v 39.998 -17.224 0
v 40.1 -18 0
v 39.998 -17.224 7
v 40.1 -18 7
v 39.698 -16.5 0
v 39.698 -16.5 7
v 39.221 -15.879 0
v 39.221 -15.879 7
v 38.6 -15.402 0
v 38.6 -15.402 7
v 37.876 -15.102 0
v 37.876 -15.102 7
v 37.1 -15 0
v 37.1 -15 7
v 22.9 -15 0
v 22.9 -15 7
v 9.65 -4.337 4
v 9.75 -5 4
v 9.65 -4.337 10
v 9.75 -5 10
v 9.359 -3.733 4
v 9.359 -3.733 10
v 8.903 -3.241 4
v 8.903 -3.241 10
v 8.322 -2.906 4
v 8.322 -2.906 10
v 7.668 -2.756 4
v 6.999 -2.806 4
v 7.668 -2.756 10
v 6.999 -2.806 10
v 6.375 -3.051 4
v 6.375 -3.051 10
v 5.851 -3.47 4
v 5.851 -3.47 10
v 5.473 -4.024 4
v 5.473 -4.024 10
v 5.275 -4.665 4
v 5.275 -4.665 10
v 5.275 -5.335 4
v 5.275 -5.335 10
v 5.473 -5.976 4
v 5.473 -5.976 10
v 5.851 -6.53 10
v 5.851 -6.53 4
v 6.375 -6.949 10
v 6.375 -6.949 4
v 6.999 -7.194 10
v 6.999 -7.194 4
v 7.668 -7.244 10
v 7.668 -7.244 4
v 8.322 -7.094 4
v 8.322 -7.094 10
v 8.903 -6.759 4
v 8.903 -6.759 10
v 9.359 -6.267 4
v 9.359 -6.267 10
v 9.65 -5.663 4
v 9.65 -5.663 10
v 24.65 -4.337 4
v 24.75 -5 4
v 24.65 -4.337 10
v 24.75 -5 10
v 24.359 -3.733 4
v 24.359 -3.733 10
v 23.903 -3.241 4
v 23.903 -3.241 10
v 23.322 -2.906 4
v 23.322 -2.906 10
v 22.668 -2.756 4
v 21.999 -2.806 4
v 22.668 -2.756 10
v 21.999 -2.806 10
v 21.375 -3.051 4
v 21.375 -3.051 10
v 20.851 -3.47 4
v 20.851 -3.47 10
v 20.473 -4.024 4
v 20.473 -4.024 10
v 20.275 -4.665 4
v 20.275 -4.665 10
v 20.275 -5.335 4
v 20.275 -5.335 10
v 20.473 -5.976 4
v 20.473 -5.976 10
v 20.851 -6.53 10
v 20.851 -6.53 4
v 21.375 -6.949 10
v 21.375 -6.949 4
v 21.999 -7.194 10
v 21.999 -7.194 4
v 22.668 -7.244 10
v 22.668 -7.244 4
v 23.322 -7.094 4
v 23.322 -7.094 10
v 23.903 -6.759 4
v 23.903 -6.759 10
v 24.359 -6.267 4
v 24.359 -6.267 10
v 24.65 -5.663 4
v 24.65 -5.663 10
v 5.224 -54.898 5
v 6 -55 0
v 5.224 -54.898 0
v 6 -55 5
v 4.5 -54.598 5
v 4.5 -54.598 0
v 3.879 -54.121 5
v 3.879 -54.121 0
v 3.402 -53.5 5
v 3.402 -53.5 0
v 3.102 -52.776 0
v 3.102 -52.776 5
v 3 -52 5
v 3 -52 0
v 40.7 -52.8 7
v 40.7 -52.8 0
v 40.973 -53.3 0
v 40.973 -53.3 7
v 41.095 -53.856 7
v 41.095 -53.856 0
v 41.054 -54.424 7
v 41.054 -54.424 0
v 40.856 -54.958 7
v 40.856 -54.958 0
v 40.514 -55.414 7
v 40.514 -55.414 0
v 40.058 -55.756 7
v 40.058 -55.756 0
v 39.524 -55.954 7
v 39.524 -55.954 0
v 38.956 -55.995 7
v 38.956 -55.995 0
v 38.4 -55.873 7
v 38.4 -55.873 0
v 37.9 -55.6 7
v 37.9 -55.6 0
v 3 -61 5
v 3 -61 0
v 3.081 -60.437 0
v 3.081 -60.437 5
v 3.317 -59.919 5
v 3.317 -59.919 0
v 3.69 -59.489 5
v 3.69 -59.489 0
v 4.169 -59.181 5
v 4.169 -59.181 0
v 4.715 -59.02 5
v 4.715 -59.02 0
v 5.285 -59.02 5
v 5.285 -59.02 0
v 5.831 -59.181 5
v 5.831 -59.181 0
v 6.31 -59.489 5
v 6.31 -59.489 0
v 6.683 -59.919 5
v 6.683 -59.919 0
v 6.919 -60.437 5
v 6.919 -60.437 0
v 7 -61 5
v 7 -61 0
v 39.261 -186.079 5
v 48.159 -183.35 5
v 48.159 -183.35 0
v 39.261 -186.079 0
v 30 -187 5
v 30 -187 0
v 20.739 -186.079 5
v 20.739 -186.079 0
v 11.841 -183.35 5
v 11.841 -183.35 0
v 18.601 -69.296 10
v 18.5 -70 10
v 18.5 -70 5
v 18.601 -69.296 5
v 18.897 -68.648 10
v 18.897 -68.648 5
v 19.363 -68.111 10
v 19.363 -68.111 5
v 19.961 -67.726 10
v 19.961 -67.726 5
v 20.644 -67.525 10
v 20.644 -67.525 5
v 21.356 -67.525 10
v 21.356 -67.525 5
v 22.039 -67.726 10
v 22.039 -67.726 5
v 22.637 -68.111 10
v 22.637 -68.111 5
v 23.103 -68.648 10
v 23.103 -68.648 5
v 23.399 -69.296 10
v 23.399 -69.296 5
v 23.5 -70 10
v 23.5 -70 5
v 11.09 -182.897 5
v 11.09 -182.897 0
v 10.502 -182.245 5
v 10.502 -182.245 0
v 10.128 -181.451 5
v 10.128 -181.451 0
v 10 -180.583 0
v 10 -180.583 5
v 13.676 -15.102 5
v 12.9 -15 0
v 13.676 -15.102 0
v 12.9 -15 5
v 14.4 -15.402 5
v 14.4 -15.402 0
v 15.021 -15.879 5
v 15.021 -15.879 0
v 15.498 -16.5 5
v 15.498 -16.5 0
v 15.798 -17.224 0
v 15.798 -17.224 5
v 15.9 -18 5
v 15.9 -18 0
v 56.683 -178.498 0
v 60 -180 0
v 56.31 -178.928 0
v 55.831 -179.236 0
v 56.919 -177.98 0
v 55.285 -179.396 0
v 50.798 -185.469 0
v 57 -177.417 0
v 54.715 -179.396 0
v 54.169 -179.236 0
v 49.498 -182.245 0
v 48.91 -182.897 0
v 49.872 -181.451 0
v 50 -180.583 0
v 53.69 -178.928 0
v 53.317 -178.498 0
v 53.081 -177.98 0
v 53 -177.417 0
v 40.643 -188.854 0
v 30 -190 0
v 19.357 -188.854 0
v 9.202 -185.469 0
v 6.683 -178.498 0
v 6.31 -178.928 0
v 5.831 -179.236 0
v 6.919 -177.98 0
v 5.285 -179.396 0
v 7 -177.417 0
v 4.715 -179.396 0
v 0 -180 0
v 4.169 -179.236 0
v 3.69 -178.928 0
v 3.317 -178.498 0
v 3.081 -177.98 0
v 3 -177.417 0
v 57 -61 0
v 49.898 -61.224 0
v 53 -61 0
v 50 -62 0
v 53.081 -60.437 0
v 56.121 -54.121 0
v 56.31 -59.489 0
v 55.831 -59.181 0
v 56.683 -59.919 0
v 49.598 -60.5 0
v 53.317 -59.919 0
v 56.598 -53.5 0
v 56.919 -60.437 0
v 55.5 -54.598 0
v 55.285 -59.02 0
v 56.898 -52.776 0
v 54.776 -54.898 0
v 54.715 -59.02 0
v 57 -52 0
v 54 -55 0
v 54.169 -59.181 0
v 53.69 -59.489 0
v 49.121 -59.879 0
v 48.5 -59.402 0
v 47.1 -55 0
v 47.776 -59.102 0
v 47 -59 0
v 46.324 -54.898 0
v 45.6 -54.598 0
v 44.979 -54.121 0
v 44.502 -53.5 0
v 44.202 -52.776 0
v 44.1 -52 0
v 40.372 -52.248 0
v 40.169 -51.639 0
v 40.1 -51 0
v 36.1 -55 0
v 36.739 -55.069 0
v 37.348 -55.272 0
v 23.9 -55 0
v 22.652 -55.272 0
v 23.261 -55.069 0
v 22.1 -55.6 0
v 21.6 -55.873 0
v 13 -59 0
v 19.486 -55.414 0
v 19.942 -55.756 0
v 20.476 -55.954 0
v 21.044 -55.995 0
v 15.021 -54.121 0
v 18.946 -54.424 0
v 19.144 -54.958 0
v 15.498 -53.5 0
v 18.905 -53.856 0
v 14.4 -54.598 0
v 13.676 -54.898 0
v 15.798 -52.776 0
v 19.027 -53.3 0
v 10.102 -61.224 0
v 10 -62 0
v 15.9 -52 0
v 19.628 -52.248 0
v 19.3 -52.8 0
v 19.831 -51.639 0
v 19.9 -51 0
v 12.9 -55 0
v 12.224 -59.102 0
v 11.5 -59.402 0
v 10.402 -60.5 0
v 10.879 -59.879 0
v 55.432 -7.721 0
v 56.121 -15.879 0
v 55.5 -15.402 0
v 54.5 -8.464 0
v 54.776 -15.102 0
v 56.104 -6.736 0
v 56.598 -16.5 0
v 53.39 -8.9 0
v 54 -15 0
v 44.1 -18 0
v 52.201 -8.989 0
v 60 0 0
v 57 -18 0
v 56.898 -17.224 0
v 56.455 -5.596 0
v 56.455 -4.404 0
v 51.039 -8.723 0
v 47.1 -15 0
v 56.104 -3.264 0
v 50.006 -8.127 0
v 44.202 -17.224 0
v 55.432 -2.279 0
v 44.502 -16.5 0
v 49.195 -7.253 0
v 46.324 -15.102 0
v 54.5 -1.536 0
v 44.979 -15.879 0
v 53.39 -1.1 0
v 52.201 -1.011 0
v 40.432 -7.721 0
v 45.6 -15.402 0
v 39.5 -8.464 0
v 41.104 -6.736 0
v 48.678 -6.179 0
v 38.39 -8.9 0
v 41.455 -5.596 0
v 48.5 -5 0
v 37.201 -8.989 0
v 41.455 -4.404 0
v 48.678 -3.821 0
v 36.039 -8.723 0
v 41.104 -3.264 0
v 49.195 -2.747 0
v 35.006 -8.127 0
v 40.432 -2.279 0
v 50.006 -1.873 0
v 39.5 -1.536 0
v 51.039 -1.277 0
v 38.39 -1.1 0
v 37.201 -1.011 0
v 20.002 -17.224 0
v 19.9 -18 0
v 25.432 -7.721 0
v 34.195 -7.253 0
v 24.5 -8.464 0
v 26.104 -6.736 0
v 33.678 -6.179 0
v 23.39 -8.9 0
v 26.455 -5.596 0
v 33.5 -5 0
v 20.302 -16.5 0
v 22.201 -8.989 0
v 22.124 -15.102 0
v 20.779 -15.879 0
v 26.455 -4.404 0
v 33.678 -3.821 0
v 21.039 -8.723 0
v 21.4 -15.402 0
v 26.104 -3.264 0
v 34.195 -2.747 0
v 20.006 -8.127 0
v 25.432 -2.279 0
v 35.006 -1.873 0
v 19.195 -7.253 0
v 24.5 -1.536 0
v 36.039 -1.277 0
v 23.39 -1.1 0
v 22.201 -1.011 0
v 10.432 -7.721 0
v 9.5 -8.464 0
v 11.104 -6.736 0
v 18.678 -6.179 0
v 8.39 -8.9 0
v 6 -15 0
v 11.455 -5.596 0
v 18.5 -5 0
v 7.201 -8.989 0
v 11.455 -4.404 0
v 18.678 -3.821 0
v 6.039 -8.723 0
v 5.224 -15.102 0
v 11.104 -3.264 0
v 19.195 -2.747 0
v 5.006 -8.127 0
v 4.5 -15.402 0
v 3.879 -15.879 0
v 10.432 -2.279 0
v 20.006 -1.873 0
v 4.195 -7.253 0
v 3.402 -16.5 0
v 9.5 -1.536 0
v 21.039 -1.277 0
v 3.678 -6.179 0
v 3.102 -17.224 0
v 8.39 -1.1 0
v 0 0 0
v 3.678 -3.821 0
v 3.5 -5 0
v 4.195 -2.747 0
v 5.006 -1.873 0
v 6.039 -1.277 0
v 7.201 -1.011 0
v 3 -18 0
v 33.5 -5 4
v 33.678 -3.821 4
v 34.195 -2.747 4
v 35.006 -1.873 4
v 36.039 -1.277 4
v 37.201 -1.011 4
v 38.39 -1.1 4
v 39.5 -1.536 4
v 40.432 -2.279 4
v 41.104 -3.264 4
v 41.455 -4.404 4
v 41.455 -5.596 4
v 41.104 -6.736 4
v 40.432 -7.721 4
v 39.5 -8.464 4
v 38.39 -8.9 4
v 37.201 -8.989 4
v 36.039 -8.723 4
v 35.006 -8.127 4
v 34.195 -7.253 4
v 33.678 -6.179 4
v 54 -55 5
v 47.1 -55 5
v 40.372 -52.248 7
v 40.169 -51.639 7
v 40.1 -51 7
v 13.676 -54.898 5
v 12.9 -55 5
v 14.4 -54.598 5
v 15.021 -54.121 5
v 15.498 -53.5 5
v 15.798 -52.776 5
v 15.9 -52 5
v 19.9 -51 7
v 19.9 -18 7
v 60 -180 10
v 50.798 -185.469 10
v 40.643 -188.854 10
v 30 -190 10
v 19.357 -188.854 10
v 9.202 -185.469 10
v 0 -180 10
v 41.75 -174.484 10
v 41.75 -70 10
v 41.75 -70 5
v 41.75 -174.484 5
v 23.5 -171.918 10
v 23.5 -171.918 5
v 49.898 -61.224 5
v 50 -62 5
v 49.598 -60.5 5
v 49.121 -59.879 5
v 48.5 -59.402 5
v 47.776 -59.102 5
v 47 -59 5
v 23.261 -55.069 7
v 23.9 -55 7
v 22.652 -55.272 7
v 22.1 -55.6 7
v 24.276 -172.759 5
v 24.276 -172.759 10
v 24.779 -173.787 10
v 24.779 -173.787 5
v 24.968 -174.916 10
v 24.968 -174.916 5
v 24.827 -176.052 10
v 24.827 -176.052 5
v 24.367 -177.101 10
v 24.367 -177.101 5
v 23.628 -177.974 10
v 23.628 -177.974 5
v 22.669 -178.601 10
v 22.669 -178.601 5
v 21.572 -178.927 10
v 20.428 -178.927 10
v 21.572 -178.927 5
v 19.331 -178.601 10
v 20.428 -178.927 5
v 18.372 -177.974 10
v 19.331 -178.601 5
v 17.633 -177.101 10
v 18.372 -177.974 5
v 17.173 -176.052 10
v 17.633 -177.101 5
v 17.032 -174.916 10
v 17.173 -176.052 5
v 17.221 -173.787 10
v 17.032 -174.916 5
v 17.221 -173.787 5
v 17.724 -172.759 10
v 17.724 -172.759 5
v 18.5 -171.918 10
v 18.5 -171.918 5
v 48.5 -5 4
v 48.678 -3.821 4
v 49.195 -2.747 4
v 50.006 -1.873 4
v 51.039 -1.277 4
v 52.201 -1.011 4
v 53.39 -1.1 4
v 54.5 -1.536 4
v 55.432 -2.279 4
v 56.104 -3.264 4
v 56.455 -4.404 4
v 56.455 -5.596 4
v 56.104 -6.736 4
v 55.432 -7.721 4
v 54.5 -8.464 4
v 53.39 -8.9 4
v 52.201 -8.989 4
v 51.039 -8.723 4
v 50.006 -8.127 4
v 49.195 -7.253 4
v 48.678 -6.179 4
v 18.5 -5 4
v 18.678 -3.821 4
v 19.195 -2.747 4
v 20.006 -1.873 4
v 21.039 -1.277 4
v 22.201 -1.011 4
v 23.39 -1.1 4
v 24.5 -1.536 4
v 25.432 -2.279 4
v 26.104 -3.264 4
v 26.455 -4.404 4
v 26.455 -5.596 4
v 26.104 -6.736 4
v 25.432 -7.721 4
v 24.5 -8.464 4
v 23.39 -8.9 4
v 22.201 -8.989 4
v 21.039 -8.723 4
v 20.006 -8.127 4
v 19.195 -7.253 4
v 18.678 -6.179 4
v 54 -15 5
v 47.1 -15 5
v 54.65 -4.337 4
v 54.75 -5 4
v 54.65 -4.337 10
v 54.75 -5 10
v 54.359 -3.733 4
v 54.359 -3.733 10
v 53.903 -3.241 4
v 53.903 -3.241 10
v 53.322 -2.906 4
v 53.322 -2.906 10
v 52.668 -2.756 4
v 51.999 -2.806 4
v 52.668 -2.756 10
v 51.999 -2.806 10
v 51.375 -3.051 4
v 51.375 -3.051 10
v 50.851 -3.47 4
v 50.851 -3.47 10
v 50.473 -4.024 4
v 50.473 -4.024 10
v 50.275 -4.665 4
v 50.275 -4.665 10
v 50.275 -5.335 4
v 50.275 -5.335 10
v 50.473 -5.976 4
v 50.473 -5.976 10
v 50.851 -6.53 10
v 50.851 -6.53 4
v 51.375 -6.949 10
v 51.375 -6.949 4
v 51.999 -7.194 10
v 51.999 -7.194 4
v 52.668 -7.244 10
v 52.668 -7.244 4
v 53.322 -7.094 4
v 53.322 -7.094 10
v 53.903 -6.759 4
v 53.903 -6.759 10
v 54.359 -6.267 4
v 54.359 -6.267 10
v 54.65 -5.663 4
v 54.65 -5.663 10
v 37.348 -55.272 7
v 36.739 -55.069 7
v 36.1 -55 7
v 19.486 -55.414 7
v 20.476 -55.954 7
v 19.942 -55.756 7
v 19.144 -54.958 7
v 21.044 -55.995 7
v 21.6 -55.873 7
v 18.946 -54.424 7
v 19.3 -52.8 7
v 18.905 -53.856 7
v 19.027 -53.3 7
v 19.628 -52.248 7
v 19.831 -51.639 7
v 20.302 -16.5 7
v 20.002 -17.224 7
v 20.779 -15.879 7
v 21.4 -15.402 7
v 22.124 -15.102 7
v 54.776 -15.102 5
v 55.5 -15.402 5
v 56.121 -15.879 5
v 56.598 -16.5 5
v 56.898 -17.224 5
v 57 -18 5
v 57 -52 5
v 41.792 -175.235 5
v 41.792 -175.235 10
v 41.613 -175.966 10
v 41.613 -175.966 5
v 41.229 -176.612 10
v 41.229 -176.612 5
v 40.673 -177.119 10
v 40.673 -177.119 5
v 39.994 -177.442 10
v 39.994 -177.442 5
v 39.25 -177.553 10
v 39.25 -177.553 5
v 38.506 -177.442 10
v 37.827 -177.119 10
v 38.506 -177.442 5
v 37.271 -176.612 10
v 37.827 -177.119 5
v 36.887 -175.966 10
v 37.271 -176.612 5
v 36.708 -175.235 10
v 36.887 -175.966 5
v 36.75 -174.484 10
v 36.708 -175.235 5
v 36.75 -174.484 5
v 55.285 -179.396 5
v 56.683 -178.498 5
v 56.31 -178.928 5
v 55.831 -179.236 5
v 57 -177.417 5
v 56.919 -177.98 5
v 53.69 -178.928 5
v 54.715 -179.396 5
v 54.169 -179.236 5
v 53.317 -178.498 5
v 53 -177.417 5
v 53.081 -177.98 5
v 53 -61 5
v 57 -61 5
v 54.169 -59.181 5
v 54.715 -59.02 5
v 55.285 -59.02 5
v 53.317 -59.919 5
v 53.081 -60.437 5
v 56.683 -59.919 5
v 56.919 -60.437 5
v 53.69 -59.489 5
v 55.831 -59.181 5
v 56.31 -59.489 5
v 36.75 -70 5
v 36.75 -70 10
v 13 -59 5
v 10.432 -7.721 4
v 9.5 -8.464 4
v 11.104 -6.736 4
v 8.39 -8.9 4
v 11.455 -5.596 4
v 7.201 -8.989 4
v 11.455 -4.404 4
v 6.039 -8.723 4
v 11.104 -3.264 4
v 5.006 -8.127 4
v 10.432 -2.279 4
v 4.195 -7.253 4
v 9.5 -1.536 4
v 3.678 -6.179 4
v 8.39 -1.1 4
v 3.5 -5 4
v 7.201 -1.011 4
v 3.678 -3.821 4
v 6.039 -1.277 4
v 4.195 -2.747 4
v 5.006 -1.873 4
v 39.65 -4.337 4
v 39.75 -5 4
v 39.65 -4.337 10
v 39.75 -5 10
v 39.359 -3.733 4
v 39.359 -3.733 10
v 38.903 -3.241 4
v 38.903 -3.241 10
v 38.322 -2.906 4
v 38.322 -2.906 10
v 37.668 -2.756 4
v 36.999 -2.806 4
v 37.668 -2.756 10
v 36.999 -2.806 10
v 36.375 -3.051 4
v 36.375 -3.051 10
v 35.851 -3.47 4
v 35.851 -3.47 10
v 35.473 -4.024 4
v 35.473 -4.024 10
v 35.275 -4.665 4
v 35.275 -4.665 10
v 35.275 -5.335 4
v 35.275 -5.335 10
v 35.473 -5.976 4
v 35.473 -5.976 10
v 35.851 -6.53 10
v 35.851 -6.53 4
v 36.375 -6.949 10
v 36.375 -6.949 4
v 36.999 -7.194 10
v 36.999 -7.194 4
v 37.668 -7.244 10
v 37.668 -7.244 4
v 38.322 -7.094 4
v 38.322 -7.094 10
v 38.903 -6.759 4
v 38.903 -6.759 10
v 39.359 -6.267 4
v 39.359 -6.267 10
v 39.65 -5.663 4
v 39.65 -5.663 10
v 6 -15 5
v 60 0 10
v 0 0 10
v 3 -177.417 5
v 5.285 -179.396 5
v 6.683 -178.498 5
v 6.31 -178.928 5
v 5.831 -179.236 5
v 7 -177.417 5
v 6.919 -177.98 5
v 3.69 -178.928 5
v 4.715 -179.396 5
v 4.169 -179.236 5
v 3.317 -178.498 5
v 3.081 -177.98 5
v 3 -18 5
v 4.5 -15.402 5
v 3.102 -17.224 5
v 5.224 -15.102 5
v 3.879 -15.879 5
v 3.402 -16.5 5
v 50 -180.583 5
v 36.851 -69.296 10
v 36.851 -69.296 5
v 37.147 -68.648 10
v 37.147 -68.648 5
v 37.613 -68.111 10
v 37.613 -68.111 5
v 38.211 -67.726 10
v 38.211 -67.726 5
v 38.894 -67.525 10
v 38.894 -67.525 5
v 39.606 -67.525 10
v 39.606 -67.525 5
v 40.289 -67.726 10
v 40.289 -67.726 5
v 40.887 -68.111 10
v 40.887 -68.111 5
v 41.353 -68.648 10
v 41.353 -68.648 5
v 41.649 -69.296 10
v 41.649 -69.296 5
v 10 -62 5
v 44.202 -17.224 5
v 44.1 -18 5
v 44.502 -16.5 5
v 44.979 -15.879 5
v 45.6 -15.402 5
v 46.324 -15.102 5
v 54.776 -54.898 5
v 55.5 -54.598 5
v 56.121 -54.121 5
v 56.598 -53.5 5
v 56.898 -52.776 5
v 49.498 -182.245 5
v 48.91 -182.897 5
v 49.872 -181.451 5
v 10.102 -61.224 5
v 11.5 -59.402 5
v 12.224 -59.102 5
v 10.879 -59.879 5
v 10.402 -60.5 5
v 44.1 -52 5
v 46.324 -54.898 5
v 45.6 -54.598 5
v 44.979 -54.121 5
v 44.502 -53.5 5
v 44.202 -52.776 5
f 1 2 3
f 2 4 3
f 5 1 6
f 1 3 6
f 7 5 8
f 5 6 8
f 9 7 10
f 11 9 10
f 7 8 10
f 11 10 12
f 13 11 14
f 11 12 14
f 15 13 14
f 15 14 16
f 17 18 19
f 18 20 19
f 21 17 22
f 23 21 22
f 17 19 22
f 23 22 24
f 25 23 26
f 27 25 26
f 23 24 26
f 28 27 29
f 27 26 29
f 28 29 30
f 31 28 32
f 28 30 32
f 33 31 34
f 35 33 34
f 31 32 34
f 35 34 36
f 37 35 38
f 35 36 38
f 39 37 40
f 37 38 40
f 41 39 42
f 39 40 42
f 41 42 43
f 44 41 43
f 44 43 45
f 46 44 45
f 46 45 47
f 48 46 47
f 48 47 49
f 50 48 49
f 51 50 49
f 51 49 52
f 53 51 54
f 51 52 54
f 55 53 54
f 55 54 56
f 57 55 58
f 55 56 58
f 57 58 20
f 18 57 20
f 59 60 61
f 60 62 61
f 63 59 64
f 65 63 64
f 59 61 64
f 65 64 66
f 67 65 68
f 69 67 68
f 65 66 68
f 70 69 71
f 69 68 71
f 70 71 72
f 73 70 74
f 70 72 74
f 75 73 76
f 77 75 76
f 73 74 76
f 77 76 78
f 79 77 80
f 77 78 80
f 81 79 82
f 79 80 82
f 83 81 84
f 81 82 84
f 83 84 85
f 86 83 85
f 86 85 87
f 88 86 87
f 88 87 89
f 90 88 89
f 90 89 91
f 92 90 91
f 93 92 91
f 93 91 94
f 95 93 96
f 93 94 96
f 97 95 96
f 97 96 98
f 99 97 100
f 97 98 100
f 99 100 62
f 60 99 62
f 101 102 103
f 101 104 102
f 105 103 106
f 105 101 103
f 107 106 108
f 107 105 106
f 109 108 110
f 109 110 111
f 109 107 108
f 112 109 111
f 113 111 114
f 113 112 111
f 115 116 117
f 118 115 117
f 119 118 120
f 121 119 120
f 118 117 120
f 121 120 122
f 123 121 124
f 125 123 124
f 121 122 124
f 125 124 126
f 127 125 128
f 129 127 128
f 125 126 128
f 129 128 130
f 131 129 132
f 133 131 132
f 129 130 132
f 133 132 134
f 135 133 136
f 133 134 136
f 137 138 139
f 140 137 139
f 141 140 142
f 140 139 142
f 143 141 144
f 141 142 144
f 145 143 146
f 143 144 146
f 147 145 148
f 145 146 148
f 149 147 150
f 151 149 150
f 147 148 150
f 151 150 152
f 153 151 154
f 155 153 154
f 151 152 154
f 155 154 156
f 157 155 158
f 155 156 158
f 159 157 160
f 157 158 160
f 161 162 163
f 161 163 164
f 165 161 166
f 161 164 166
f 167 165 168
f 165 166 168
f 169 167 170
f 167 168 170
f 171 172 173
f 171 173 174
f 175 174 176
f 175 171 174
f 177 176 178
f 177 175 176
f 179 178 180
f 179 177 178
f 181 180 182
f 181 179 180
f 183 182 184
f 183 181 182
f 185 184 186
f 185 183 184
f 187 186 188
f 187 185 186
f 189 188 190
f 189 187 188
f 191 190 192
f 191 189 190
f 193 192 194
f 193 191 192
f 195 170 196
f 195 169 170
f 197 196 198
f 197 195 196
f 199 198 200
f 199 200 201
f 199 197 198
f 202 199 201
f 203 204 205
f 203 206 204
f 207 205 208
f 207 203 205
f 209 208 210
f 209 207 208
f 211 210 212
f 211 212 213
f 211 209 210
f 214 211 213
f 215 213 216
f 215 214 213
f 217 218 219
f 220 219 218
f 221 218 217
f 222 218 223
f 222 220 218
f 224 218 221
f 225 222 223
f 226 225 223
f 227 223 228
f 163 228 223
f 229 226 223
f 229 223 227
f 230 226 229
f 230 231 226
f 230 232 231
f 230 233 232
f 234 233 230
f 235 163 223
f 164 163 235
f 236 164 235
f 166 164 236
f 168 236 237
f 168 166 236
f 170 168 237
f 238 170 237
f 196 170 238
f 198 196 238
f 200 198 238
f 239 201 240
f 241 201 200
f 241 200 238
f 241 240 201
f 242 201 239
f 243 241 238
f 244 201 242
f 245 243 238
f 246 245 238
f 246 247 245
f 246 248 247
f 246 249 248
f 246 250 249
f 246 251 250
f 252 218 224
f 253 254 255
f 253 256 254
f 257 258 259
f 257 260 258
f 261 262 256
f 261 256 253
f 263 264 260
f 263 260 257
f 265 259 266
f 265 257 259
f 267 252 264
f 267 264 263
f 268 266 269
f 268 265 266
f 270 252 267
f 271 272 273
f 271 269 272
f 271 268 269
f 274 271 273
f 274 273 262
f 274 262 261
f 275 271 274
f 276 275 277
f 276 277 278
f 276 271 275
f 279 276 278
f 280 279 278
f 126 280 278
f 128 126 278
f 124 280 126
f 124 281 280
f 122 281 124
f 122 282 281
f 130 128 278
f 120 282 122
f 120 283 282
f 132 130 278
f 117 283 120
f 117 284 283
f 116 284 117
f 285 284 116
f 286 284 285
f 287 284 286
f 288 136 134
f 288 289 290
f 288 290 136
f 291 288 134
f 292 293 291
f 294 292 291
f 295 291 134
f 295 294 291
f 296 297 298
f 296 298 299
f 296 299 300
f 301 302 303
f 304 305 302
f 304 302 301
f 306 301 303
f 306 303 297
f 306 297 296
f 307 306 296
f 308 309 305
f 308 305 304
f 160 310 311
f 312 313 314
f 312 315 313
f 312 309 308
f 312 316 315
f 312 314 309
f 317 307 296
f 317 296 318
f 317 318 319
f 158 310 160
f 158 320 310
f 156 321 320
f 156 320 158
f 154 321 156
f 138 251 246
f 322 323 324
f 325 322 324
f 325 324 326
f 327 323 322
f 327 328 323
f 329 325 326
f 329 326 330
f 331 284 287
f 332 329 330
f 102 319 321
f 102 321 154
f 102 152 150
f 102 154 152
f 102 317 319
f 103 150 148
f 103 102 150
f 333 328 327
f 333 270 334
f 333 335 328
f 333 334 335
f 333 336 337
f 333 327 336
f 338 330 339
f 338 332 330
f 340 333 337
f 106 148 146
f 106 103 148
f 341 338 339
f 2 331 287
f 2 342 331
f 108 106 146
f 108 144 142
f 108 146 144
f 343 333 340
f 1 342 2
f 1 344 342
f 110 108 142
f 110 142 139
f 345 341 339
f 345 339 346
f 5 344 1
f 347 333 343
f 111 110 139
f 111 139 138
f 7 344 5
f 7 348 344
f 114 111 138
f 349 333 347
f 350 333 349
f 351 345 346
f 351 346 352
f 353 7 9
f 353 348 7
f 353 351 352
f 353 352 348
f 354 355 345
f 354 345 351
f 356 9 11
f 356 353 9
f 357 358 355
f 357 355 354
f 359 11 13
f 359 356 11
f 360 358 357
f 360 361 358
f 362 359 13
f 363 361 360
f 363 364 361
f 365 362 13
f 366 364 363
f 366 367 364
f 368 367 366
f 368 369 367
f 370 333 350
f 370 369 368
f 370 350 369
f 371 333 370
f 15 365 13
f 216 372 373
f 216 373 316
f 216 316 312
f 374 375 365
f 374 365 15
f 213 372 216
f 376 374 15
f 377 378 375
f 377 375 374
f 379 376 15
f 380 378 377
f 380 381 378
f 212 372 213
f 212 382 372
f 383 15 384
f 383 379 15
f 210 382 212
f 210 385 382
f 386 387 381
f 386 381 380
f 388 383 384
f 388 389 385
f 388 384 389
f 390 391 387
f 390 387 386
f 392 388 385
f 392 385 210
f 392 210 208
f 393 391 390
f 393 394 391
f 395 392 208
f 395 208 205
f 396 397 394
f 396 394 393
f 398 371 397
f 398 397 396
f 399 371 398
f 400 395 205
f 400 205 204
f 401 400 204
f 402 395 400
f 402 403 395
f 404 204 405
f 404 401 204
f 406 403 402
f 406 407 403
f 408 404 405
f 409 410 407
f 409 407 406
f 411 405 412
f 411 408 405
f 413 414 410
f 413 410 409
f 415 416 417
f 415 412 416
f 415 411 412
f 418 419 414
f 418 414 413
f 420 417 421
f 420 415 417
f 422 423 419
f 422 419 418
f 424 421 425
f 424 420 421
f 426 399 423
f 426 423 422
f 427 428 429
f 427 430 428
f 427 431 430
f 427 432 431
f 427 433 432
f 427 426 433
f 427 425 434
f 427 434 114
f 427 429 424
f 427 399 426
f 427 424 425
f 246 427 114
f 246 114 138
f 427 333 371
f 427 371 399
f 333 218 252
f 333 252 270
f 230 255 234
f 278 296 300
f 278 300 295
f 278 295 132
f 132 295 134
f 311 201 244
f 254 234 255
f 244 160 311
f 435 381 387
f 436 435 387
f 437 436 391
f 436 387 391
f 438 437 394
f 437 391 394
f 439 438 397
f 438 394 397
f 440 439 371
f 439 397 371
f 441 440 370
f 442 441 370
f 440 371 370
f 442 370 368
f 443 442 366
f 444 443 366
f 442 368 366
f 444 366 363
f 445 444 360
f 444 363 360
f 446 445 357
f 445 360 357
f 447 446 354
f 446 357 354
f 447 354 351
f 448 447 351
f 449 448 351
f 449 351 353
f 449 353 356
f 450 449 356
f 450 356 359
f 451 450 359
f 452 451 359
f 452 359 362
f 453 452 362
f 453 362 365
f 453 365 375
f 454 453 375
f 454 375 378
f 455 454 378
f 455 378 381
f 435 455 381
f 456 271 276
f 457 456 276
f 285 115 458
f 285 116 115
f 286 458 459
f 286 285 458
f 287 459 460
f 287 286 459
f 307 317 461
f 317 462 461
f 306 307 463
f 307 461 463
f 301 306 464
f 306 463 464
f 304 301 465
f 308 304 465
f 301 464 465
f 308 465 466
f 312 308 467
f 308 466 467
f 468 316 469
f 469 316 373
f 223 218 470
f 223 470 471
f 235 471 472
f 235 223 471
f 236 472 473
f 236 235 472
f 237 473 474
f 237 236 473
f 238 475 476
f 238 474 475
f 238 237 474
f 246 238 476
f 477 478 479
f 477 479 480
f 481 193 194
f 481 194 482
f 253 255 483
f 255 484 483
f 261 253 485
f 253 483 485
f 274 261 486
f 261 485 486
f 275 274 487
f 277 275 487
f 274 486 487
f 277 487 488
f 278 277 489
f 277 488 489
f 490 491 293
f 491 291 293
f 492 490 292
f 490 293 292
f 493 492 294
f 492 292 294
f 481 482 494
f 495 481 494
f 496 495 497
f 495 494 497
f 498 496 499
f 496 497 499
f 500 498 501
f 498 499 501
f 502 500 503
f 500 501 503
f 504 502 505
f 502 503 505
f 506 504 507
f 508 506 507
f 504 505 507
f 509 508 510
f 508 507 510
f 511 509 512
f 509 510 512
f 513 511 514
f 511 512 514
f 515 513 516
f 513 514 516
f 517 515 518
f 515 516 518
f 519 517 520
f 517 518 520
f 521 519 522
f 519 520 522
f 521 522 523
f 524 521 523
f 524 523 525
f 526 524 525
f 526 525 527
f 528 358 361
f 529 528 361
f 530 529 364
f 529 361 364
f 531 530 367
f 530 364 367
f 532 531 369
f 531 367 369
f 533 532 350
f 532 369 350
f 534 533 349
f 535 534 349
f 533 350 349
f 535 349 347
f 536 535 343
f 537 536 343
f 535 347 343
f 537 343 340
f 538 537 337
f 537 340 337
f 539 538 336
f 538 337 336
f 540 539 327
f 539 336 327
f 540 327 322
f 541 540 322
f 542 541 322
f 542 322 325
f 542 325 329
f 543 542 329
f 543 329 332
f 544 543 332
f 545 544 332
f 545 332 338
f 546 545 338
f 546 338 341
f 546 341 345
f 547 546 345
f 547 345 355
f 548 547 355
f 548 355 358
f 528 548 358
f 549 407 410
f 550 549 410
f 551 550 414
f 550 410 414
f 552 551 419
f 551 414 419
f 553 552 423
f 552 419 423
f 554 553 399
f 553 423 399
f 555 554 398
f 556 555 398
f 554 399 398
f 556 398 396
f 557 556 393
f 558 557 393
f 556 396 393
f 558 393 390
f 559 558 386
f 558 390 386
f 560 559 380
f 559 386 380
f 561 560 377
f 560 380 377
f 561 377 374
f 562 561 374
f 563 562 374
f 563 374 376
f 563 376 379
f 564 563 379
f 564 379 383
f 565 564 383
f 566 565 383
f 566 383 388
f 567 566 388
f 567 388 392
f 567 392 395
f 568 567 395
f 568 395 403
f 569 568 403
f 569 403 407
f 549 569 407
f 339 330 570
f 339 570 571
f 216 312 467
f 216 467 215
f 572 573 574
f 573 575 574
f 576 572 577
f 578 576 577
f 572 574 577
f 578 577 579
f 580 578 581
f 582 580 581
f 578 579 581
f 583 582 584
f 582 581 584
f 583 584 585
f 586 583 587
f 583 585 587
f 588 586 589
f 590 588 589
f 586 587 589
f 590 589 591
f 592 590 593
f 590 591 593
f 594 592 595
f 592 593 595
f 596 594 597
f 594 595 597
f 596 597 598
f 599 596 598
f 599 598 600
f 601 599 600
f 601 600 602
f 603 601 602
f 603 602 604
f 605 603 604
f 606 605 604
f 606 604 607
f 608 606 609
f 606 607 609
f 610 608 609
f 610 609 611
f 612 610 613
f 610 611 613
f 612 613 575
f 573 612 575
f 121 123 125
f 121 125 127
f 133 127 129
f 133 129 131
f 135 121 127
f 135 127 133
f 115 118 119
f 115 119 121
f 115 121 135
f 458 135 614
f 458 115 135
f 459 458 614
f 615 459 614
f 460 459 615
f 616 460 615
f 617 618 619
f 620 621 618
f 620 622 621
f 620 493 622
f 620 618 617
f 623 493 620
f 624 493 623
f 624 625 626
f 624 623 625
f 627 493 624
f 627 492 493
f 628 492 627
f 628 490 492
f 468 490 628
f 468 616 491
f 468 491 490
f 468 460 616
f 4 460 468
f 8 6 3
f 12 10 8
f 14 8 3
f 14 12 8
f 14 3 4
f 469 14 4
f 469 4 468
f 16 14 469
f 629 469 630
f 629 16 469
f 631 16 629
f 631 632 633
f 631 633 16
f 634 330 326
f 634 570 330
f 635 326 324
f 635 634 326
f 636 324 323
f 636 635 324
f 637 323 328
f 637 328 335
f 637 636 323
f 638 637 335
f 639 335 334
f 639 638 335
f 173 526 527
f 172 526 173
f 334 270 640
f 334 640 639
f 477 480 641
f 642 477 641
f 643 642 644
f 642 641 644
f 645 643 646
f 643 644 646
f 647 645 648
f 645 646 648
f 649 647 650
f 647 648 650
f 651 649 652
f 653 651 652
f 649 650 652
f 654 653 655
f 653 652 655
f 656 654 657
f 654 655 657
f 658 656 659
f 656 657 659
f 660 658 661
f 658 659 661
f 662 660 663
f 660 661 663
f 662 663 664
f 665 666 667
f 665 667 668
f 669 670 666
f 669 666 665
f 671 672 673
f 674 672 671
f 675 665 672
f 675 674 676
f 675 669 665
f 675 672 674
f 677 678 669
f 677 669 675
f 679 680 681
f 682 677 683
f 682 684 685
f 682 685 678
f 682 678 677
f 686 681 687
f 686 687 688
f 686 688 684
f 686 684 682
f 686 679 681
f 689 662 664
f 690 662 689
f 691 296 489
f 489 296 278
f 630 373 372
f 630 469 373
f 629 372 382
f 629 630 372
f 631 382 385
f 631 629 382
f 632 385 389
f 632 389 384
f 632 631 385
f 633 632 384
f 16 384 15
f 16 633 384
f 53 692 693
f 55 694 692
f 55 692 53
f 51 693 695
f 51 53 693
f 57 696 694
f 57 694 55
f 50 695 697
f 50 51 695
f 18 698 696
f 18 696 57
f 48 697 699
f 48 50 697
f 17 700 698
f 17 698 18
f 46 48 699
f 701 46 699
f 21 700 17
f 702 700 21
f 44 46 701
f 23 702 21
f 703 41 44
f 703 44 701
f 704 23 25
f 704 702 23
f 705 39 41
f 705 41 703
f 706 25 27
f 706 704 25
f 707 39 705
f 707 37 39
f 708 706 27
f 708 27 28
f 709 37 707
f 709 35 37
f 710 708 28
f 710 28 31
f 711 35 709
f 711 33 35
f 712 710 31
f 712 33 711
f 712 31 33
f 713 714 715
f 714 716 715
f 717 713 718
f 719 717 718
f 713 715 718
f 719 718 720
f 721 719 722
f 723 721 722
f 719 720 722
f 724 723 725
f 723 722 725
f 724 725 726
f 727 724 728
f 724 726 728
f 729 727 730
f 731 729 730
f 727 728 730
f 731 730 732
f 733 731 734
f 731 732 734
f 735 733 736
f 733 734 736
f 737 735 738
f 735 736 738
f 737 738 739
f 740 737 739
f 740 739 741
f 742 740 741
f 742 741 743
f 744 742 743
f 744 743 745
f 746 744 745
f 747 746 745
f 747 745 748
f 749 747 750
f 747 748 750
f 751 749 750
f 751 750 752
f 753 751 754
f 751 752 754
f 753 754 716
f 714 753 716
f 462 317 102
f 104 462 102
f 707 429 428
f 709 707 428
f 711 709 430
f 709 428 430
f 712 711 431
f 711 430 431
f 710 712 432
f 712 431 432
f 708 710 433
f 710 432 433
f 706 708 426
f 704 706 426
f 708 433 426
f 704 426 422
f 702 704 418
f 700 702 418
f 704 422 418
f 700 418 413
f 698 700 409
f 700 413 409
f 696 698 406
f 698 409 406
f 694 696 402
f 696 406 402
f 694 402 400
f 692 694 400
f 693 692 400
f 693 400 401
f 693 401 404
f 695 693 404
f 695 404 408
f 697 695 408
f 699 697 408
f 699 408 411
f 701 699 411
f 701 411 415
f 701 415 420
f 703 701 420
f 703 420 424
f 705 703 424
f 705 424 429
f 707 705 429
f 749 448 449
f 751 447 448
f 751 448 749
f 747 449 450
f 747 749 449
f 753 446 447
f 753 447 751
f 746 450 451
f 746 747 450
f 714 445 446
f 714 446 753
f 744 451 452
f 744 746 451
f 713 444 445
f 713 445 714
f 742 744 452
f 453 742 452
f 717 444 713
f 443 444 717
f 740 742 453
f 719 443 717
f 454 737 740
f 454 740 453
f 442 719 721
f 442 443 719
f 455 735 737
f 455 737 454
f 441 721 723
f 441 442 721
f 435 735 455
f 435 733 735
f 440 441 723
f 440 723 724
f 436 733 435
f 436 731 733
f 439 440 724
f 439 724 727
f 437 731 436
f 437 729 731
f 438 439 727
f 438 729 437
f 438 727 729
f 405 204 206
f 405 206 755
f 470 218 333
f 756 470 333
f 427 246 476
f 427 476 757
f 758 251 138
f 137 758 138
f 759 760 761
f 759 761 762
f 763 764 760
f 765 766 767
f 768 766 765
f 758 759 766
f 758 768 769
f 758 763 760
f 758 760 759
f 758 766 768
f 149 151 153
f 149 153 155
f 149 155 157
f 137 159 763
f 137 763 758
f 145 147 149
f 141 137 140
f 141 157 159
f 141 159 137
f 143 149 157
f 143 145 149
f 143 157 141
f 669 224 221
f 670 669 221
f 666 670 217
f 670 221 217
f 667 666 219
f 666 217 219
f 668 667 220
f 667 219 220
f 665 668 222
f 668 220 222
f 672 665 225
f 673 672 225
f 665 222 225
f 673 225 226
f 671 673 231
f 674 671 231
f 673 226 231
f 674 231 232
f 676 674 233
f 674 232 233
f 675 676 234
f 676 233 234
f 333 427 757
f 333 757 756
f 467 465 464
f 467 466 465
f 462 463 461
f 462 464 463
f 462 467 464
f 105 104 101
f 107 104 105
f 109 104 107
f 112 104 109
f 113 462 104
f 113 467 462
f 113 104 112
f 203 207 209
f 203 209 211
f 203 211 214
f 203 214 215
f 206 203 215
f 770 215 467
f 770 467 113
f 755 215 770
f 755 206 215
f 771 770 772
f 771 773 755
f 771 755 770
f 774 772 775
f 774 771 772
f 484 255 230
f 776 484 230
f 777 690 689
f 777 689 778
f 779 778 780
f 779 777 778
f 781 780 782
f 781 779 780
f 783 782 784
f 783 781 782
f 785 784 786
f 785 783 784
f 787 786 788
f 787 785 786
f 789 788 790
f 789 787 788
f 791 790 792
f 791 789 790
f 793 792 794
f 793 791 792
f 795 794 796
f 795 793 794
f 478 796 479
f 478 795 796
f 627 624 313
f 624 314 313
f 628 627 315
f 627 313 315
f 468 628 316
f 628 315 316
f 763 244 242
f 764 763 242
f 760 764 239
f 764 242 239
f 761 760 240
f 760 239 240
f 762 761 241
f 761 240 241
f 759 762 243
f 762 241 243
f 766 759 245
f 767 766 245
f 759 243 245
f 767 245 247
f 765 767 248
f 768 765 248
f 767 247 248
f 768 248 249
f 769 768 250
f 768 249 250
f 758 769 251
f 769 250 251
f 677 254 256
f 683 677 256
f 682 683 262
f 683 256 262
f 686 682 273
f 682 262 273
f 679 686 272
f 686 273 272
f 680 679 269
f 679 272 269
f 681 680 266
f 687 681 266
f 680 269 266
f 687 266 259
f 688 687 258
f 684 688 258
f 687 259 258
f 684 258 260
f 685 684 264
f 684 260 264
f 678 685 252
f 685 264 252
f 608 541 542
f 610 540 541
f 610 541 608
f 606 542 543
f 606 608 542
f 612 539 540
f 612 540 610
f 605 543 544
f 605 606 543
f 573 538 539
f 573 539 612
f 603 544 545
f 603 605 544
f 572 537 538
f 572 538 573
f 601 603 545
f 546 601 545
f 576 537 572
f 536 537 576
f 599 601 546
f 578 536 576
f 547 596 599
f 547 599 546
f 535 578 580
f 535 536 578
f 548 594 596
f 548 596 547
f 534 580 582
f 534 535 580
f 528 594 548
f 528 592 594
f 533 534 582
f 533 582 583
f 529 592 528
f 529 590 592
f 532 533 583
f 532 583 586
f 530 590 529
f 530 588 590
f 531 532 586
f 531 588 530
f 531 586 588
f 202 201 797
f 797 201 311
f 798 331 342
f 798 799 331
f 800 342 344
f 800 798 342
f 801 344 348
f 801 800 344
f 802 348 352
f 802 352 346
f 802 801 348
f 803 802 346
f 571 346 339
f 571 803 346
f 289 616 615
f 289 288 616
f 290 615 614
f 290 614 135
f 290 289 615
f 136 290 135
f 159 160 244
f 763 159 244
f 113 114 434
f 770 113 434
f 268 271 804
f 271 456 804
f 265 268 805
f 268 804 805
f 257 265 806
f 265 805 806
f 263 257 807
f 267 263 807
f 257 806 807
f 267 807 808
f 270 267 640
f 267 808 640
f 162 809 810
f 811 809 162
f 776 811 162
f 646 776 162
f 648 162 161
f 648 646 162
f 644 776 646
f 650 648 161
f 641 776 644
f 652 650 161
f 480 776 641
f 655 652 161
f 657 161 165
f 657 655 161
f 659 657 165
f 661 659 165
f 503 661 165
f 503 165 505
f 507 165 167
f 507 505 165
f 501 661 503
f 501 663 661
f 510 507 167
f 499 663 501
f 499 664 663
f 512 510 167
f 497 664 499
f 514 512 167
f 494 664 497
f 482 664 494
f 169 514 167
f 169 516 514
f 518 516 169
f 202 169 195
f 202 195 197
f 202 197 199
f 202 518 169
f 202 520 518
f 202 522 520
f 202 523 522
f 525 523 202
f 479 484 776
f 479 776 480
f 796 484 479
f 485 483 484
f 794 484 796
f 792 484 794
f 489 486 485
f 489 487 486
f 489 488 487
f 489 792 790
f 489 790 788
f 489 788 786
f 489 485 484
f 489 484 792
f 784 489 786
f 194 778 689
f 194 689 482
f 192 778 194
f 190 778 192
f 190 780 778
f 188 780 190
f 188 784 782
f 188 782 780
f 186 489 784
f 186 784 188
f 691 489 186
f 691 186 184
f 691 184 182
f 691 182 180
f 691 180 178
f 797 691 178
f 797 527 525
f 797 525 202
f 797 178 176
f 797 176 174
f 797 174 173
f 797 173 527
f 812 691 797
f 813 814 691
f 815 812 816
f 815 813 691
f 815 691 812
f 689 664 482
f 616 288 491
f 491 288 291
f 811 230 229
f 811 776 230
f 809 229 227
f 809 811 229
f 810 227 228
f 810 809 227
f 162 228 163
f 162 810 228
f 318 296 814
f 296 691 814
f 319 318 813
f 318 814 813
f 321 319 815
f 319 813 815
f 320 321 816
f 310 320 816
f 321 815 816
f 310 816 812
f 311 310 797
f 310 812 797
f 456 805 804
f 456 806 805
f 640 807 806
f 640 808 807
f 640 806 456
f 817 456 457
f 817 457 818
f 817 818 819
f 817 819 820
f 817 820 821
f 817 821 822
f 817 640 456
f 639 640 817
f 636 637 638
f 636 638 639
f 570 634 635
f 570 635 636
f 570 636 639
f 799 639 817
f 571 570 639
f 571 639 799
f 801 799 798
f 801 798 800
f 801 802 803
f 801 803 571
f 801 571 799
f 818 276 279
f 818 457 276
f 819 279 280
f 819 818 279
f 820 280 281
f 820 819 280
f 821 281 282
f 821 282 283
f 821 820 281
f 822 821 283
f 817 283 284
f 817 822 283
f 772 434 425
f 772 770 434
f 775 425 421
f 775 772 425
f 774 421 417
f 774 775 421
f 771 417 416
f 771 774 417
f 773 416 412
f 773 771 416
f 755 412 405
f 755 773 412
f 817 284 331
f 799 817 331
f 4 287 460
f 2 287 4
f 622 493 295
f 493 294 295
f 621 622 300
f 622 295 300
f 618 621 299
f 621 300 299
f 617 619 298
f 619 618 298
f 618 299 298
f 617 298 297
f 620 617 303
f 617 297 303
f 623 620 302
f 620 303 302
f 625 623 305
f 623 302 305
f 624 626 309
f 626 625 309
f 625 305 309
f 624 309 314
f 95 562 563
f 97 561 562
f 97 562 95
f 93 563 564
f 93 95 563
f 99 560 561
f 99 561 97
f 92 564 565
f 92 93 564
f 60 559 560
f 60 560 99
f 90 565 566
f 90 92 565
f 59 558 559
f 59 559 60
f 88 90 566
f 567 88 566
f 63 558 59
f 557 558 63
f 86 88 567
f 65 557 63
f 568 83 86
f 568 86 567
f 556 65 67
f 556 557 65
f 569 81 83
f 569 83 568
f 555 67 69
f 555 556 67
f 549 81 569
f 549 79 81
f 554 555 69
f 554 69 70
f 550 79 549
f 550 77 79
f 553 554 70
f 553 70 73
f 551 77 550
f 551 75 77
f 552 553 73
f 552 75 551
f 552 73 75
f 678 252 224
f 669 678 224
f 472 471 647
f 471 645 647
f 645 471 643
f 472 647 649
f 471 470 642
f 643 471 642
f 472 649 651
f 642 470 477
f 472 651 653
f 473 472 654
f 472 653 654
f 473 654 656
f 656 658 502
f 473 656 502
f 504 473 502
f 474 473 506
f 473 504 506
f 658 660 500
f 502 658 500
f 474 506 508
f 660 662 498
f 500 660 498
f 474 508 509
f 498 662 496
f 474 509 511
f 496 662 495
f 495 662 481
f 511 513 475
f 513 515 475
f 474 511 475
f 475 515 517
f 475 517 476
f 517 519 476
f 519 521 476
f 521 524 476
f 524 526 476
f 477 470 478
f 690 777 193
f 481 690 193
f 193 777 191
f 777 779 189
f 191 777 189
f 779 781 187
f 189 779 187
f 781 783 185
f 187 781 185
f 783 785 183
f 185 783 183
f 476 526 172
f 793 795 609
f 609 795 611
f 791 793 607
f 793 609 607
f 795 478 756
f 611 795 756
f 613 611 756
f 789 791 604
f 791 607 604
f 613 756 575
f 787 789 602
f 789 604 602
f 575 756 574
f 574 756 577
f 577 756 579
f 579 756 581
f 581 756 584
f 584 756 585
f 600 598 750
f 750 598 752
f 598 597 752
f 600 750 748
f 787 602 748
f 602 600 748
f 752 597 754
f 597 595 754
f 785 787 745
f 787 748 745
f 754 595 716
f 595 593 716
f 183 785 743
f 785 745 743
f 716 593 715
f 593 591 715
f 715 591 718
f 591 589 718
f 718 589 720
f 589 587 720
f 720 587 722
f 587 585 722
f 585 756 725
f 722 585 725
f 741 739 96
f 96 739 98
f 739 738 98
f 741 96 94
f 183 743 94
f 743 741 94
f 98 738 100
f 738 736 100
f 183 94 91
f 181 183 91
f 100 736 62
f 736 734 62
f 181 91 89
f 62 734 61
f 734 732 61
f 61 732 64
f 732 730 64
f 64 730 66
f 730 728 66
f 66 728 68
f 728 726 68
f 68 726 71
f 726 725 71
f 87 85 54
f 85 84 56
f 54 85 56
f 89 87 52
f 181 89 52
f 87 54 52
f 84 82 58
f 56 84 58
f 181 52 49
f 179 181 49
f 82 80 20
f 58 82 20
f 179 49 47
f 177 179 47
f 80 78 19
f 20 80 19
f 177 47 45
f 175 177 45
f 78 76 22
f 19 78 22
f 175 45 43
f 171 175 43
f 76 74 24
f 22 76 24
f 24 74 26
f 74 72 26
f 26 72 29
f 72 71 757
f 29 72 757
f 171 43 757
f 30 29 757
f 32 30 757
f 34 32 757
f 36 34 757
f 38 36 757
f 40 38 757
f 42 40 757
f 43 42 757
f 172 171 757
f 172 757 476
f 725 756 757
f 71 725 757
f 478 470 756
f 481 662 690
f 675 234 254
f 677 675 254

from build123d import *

# Parameters (mm, degrees)
EXTRUDE_1_DEPTH            = 10
HOLE_WIZARD_M4_D           = 4.5
HOLE_WIZARD_M4_CBORE_D     = 8
HOLE_WIZARD_M4_CBORE_DEPTH = 4
HOLE_WIZARD_1_4_201_D      = 5.1054
HOLE_WIZARD_3_8_161_D      = 7.9375
CUT_EXTRUDE_1_DEPTH        = 11
SKETCH_14_W                = 20.2
SKETCH_14_H                = 40
CUT_EXTRUDE_2_DEPTH        = 7
SKETCH_15_R                = 2
CUT_EXTRUDE_3_DEPTH        = 7
CUT_EXTRUDE_4_DEPTH        = 11
CUT_EXTRUDE_7_DEPTH        = 5
CUT_EXTRUDE_8_DEPTH        = 5
SKETCH_18_W                = 12.9
SKETCH_18_H                = 40
CUT_EXTRUDE_6_DEPTH        = 5
FILLET_1_R                 = 3


with BuildPart() as part:
    # Эскиз1 → Бобышка-Вытянуть1 (new body)
    with BuildSketch(Plane.XY):
        Polygon((0, 0), (60, 0), (60, -60), (60, -150), (60, -190), (0, -190), align=None)
    extrude(amount=EXTRUDE_1_DEPTH)

    # Цековка для винта с внутренним шестигранником M4 (through all)
    with Locations(Plane(origin=(-14.842707118, -41.655134189, 0), x_dir=(-1, 0, 0), z_dir=(0, 0, -1))):
        with Locations((-67.342707118, 36.655134189), (-52.342707118, 36.655134189), (-37.342707118, 36.655134189), (-22.342707118, 36.655134189)):
            CounterBoreHole(HOLE_WIZARD_M4_D / 2, HOLE_WIZARD_M4_CBORE_D / 2, HOLE_WIZARD_M4_CBORE_DEPTH)

    # Отверстие обработанное метчиком 1/4-201 (through all)
    with Locations(Plane(origin=(39.25, -175, 10), x_dir=(1, 0, 0), z_dir=(0, 0, 1))):
        with Locations((0, 0)):
            Hole(HOLE_WIZARD_1_4_201_D / 2)

    # Отверстие обработанное метчиком 3/8-161 (through all)
    with Locations(Plane(origin=(21, -175, 10), x_dir=(1, 0, 0), z_dir=(0, 0, 1))):
        with Locations((0, 0)):
            Hole(HOLE_WIZARD_3_8_161_D / 2)

    # Эскиз12 → Вырез-Вытянуть1 (cut, through all)
    with BuildSketch(Plane.XY.offset(10)):
        with BuildLine():
            Line((36.75, -175), (36.75, -70))
            ThreePointArc((36.75, -70), (39.25, -67.5), (41.75, -70))
            Line((41.75, -70), (41.75, -175))
            ThreePointArc((41.75, -175), (39.25, -177.5), (36.75, -175))
        make_face()
        with BuildLine():
            Line((18.5, -175), (18.5, -70))
            ThreePointArc((18.5, -70), (21, -67.5), (23.5, -70))
            Line((23.5, -70), (23.5, -175))
            ThreePointArc((23.5, -175), (21, -177.5), (18.5, -175))
        make_face()
    extrude(amount=-CUT_EXTRUDE_1_DEPTH, mode=Mode.SUBTRACT)

    # Эскиз14 → Вырез-Вытянуть2 (cut)
    with BuildSketch(Plane(origin=(0, 0, 0), x_dir=(-1, 0, 0), z_dir=(0, 0, -1))):
        with Locations((-30, -35)):
            Rectangle(SKETCH_14_W, SKETCH_14_H)
    extrude(amount=-CUT_EXTRUDE_2_DEPTH, mode=Mode.SUBTRACT)

    # Эскиз15 → Вырез-Вытянуть3 (cut)
    with BuildSketch(Plane(origin=(0, 0, 0), x_dir=(-1, 0, 0), z_dir=(0, 0, -1))):
        with Locations((-39.1, -54)):
            Circle(SKETCH_15_R)
        with Locations((-20.9, -54)):
            Circle(SKETCH_15_R)
    extrude(amount=-CUT_EXTRUDE_3_DEPTH, mode=Mode.SUBTRACT)

    # Эскиз16 → Вырез-Вытянуть4 (cut, through all)
    with BuildSketch(Plane(origin=(0, 0, 0), x_dir=(-1, 0, 0), z_dir=(0, 0, -1))):
        with BuildLine():
            Line((0, -180), (0, -195))
            Line((0, -195), (-60, -195))
            Line((-60, -195), (-60, -180))
            ThreePointArc((-60, -180), (-30, -190), (0, -180))
        make_face()
    extrude(amount=-CUT_EXTRUDE_4_DEPTH, mode=Mode.SUBTRACT)

    # Эскиз19 → Вырез-Вытянуть7 (cut)
    with BuildSketch(Plane(origin=(0, 0, 0), x_dir=(-1, 0, 0), z_dir=(0, 0, -1))):
        with BuildLine():
            Line((-57, -61), (-57, -177.416573868))
            ThreePointArc((-57, -177.416573868), (-55, -179.416573868), (-53, -177.416573868))
            Line((-53, -177.416573868), (-53, -61))
            ThreePointArc((-53, -61), (-55, -59), (-57, -61))
        make_face()
        with BuildLine():
            Line((-7, -61), (-7, -177.416573868))
            ThreePointArc((-7, -177.416573868), (-5, -179.416573868), (-3, -177.416573868))
            Line((-3, -177.416573868), (-3, -61))
            ThreePointArc((-3, -61), (-5, -59), (-7, -61))
        make_face()
    extrude(amount=-CUT_EXTRUDE_7_DEPTH, mode=Mode.SUBTRACT)

    # Эскиз20 → Вырез-Вытянуть8 (cut)
    with BuildSketch(Plane(origin=(0, 0, 0), x_dir=(-1, 0, 0), z_dir=(0, 0, -1))):
        with BuildLine():
            Line((-50, -59), (-50, -182.532340636))
            ThreePointArc((-50, -182.532340636), (-30, -187), (-10, -182.532340636))
            Line((-10, -182.532340636), (-10, -59))
            Line((-10, -59), (-50, -59))
        make_face()
    extrude(amount=-CUT_EXTRUDE_8_DEPTH, mode=Mode.SUBTRACT)

    # Эскиз18 → Вырез-Вытянуть6 (cut)
    with BuildSketch(Plane(origin=(0, 0, 0), x_dir=(-1, 0, 0), z_dir=(0, 0, -1))):
        with Locations((-50.55, -35)):
            Rectangle(SKETCH_18_W, SKETCH_18_H)
        with Locations((-9.45, -35)):
            Rectangle(SKETCH_18_W, SKETCH_18_H)
    extrude(amount=-CUT_EXTRUDE_6_DEPTH, mode=Mode.SUBTRACT)

    # Скругление1
    fillet_1_edges = [part.edges().sort_by_distance(p)[0] for p in [
        (19.9, -15, 3.5),
        (40.1, -15, 3.5),
        (37.367949192, -55, 3.5),
        (40.1, -52.267949192, 3.5),
        (19.9, -52.267949192, 3.5),
        (22.632050808, -55, 3.5),
        (50, -59, 2.5),
        (10, -59, 2.5),
        (10, -182.532340636, 2.5),
        (50, -182.532340636, 2.5),
        (57, -55, 2.5),
        (57, -15, 2.5),
        (44.1, -15, 2.5),
        (44.1, -55, 2.5),
        (15.9, -15, 2.5),
        (3, -15, 2.5),
        (3, -55, 2.5),
        (15.9, -55, 2.5),
    ]]
    fillet(fillet_1_edges, radius=FILLET_1_R)


solid = part.part
